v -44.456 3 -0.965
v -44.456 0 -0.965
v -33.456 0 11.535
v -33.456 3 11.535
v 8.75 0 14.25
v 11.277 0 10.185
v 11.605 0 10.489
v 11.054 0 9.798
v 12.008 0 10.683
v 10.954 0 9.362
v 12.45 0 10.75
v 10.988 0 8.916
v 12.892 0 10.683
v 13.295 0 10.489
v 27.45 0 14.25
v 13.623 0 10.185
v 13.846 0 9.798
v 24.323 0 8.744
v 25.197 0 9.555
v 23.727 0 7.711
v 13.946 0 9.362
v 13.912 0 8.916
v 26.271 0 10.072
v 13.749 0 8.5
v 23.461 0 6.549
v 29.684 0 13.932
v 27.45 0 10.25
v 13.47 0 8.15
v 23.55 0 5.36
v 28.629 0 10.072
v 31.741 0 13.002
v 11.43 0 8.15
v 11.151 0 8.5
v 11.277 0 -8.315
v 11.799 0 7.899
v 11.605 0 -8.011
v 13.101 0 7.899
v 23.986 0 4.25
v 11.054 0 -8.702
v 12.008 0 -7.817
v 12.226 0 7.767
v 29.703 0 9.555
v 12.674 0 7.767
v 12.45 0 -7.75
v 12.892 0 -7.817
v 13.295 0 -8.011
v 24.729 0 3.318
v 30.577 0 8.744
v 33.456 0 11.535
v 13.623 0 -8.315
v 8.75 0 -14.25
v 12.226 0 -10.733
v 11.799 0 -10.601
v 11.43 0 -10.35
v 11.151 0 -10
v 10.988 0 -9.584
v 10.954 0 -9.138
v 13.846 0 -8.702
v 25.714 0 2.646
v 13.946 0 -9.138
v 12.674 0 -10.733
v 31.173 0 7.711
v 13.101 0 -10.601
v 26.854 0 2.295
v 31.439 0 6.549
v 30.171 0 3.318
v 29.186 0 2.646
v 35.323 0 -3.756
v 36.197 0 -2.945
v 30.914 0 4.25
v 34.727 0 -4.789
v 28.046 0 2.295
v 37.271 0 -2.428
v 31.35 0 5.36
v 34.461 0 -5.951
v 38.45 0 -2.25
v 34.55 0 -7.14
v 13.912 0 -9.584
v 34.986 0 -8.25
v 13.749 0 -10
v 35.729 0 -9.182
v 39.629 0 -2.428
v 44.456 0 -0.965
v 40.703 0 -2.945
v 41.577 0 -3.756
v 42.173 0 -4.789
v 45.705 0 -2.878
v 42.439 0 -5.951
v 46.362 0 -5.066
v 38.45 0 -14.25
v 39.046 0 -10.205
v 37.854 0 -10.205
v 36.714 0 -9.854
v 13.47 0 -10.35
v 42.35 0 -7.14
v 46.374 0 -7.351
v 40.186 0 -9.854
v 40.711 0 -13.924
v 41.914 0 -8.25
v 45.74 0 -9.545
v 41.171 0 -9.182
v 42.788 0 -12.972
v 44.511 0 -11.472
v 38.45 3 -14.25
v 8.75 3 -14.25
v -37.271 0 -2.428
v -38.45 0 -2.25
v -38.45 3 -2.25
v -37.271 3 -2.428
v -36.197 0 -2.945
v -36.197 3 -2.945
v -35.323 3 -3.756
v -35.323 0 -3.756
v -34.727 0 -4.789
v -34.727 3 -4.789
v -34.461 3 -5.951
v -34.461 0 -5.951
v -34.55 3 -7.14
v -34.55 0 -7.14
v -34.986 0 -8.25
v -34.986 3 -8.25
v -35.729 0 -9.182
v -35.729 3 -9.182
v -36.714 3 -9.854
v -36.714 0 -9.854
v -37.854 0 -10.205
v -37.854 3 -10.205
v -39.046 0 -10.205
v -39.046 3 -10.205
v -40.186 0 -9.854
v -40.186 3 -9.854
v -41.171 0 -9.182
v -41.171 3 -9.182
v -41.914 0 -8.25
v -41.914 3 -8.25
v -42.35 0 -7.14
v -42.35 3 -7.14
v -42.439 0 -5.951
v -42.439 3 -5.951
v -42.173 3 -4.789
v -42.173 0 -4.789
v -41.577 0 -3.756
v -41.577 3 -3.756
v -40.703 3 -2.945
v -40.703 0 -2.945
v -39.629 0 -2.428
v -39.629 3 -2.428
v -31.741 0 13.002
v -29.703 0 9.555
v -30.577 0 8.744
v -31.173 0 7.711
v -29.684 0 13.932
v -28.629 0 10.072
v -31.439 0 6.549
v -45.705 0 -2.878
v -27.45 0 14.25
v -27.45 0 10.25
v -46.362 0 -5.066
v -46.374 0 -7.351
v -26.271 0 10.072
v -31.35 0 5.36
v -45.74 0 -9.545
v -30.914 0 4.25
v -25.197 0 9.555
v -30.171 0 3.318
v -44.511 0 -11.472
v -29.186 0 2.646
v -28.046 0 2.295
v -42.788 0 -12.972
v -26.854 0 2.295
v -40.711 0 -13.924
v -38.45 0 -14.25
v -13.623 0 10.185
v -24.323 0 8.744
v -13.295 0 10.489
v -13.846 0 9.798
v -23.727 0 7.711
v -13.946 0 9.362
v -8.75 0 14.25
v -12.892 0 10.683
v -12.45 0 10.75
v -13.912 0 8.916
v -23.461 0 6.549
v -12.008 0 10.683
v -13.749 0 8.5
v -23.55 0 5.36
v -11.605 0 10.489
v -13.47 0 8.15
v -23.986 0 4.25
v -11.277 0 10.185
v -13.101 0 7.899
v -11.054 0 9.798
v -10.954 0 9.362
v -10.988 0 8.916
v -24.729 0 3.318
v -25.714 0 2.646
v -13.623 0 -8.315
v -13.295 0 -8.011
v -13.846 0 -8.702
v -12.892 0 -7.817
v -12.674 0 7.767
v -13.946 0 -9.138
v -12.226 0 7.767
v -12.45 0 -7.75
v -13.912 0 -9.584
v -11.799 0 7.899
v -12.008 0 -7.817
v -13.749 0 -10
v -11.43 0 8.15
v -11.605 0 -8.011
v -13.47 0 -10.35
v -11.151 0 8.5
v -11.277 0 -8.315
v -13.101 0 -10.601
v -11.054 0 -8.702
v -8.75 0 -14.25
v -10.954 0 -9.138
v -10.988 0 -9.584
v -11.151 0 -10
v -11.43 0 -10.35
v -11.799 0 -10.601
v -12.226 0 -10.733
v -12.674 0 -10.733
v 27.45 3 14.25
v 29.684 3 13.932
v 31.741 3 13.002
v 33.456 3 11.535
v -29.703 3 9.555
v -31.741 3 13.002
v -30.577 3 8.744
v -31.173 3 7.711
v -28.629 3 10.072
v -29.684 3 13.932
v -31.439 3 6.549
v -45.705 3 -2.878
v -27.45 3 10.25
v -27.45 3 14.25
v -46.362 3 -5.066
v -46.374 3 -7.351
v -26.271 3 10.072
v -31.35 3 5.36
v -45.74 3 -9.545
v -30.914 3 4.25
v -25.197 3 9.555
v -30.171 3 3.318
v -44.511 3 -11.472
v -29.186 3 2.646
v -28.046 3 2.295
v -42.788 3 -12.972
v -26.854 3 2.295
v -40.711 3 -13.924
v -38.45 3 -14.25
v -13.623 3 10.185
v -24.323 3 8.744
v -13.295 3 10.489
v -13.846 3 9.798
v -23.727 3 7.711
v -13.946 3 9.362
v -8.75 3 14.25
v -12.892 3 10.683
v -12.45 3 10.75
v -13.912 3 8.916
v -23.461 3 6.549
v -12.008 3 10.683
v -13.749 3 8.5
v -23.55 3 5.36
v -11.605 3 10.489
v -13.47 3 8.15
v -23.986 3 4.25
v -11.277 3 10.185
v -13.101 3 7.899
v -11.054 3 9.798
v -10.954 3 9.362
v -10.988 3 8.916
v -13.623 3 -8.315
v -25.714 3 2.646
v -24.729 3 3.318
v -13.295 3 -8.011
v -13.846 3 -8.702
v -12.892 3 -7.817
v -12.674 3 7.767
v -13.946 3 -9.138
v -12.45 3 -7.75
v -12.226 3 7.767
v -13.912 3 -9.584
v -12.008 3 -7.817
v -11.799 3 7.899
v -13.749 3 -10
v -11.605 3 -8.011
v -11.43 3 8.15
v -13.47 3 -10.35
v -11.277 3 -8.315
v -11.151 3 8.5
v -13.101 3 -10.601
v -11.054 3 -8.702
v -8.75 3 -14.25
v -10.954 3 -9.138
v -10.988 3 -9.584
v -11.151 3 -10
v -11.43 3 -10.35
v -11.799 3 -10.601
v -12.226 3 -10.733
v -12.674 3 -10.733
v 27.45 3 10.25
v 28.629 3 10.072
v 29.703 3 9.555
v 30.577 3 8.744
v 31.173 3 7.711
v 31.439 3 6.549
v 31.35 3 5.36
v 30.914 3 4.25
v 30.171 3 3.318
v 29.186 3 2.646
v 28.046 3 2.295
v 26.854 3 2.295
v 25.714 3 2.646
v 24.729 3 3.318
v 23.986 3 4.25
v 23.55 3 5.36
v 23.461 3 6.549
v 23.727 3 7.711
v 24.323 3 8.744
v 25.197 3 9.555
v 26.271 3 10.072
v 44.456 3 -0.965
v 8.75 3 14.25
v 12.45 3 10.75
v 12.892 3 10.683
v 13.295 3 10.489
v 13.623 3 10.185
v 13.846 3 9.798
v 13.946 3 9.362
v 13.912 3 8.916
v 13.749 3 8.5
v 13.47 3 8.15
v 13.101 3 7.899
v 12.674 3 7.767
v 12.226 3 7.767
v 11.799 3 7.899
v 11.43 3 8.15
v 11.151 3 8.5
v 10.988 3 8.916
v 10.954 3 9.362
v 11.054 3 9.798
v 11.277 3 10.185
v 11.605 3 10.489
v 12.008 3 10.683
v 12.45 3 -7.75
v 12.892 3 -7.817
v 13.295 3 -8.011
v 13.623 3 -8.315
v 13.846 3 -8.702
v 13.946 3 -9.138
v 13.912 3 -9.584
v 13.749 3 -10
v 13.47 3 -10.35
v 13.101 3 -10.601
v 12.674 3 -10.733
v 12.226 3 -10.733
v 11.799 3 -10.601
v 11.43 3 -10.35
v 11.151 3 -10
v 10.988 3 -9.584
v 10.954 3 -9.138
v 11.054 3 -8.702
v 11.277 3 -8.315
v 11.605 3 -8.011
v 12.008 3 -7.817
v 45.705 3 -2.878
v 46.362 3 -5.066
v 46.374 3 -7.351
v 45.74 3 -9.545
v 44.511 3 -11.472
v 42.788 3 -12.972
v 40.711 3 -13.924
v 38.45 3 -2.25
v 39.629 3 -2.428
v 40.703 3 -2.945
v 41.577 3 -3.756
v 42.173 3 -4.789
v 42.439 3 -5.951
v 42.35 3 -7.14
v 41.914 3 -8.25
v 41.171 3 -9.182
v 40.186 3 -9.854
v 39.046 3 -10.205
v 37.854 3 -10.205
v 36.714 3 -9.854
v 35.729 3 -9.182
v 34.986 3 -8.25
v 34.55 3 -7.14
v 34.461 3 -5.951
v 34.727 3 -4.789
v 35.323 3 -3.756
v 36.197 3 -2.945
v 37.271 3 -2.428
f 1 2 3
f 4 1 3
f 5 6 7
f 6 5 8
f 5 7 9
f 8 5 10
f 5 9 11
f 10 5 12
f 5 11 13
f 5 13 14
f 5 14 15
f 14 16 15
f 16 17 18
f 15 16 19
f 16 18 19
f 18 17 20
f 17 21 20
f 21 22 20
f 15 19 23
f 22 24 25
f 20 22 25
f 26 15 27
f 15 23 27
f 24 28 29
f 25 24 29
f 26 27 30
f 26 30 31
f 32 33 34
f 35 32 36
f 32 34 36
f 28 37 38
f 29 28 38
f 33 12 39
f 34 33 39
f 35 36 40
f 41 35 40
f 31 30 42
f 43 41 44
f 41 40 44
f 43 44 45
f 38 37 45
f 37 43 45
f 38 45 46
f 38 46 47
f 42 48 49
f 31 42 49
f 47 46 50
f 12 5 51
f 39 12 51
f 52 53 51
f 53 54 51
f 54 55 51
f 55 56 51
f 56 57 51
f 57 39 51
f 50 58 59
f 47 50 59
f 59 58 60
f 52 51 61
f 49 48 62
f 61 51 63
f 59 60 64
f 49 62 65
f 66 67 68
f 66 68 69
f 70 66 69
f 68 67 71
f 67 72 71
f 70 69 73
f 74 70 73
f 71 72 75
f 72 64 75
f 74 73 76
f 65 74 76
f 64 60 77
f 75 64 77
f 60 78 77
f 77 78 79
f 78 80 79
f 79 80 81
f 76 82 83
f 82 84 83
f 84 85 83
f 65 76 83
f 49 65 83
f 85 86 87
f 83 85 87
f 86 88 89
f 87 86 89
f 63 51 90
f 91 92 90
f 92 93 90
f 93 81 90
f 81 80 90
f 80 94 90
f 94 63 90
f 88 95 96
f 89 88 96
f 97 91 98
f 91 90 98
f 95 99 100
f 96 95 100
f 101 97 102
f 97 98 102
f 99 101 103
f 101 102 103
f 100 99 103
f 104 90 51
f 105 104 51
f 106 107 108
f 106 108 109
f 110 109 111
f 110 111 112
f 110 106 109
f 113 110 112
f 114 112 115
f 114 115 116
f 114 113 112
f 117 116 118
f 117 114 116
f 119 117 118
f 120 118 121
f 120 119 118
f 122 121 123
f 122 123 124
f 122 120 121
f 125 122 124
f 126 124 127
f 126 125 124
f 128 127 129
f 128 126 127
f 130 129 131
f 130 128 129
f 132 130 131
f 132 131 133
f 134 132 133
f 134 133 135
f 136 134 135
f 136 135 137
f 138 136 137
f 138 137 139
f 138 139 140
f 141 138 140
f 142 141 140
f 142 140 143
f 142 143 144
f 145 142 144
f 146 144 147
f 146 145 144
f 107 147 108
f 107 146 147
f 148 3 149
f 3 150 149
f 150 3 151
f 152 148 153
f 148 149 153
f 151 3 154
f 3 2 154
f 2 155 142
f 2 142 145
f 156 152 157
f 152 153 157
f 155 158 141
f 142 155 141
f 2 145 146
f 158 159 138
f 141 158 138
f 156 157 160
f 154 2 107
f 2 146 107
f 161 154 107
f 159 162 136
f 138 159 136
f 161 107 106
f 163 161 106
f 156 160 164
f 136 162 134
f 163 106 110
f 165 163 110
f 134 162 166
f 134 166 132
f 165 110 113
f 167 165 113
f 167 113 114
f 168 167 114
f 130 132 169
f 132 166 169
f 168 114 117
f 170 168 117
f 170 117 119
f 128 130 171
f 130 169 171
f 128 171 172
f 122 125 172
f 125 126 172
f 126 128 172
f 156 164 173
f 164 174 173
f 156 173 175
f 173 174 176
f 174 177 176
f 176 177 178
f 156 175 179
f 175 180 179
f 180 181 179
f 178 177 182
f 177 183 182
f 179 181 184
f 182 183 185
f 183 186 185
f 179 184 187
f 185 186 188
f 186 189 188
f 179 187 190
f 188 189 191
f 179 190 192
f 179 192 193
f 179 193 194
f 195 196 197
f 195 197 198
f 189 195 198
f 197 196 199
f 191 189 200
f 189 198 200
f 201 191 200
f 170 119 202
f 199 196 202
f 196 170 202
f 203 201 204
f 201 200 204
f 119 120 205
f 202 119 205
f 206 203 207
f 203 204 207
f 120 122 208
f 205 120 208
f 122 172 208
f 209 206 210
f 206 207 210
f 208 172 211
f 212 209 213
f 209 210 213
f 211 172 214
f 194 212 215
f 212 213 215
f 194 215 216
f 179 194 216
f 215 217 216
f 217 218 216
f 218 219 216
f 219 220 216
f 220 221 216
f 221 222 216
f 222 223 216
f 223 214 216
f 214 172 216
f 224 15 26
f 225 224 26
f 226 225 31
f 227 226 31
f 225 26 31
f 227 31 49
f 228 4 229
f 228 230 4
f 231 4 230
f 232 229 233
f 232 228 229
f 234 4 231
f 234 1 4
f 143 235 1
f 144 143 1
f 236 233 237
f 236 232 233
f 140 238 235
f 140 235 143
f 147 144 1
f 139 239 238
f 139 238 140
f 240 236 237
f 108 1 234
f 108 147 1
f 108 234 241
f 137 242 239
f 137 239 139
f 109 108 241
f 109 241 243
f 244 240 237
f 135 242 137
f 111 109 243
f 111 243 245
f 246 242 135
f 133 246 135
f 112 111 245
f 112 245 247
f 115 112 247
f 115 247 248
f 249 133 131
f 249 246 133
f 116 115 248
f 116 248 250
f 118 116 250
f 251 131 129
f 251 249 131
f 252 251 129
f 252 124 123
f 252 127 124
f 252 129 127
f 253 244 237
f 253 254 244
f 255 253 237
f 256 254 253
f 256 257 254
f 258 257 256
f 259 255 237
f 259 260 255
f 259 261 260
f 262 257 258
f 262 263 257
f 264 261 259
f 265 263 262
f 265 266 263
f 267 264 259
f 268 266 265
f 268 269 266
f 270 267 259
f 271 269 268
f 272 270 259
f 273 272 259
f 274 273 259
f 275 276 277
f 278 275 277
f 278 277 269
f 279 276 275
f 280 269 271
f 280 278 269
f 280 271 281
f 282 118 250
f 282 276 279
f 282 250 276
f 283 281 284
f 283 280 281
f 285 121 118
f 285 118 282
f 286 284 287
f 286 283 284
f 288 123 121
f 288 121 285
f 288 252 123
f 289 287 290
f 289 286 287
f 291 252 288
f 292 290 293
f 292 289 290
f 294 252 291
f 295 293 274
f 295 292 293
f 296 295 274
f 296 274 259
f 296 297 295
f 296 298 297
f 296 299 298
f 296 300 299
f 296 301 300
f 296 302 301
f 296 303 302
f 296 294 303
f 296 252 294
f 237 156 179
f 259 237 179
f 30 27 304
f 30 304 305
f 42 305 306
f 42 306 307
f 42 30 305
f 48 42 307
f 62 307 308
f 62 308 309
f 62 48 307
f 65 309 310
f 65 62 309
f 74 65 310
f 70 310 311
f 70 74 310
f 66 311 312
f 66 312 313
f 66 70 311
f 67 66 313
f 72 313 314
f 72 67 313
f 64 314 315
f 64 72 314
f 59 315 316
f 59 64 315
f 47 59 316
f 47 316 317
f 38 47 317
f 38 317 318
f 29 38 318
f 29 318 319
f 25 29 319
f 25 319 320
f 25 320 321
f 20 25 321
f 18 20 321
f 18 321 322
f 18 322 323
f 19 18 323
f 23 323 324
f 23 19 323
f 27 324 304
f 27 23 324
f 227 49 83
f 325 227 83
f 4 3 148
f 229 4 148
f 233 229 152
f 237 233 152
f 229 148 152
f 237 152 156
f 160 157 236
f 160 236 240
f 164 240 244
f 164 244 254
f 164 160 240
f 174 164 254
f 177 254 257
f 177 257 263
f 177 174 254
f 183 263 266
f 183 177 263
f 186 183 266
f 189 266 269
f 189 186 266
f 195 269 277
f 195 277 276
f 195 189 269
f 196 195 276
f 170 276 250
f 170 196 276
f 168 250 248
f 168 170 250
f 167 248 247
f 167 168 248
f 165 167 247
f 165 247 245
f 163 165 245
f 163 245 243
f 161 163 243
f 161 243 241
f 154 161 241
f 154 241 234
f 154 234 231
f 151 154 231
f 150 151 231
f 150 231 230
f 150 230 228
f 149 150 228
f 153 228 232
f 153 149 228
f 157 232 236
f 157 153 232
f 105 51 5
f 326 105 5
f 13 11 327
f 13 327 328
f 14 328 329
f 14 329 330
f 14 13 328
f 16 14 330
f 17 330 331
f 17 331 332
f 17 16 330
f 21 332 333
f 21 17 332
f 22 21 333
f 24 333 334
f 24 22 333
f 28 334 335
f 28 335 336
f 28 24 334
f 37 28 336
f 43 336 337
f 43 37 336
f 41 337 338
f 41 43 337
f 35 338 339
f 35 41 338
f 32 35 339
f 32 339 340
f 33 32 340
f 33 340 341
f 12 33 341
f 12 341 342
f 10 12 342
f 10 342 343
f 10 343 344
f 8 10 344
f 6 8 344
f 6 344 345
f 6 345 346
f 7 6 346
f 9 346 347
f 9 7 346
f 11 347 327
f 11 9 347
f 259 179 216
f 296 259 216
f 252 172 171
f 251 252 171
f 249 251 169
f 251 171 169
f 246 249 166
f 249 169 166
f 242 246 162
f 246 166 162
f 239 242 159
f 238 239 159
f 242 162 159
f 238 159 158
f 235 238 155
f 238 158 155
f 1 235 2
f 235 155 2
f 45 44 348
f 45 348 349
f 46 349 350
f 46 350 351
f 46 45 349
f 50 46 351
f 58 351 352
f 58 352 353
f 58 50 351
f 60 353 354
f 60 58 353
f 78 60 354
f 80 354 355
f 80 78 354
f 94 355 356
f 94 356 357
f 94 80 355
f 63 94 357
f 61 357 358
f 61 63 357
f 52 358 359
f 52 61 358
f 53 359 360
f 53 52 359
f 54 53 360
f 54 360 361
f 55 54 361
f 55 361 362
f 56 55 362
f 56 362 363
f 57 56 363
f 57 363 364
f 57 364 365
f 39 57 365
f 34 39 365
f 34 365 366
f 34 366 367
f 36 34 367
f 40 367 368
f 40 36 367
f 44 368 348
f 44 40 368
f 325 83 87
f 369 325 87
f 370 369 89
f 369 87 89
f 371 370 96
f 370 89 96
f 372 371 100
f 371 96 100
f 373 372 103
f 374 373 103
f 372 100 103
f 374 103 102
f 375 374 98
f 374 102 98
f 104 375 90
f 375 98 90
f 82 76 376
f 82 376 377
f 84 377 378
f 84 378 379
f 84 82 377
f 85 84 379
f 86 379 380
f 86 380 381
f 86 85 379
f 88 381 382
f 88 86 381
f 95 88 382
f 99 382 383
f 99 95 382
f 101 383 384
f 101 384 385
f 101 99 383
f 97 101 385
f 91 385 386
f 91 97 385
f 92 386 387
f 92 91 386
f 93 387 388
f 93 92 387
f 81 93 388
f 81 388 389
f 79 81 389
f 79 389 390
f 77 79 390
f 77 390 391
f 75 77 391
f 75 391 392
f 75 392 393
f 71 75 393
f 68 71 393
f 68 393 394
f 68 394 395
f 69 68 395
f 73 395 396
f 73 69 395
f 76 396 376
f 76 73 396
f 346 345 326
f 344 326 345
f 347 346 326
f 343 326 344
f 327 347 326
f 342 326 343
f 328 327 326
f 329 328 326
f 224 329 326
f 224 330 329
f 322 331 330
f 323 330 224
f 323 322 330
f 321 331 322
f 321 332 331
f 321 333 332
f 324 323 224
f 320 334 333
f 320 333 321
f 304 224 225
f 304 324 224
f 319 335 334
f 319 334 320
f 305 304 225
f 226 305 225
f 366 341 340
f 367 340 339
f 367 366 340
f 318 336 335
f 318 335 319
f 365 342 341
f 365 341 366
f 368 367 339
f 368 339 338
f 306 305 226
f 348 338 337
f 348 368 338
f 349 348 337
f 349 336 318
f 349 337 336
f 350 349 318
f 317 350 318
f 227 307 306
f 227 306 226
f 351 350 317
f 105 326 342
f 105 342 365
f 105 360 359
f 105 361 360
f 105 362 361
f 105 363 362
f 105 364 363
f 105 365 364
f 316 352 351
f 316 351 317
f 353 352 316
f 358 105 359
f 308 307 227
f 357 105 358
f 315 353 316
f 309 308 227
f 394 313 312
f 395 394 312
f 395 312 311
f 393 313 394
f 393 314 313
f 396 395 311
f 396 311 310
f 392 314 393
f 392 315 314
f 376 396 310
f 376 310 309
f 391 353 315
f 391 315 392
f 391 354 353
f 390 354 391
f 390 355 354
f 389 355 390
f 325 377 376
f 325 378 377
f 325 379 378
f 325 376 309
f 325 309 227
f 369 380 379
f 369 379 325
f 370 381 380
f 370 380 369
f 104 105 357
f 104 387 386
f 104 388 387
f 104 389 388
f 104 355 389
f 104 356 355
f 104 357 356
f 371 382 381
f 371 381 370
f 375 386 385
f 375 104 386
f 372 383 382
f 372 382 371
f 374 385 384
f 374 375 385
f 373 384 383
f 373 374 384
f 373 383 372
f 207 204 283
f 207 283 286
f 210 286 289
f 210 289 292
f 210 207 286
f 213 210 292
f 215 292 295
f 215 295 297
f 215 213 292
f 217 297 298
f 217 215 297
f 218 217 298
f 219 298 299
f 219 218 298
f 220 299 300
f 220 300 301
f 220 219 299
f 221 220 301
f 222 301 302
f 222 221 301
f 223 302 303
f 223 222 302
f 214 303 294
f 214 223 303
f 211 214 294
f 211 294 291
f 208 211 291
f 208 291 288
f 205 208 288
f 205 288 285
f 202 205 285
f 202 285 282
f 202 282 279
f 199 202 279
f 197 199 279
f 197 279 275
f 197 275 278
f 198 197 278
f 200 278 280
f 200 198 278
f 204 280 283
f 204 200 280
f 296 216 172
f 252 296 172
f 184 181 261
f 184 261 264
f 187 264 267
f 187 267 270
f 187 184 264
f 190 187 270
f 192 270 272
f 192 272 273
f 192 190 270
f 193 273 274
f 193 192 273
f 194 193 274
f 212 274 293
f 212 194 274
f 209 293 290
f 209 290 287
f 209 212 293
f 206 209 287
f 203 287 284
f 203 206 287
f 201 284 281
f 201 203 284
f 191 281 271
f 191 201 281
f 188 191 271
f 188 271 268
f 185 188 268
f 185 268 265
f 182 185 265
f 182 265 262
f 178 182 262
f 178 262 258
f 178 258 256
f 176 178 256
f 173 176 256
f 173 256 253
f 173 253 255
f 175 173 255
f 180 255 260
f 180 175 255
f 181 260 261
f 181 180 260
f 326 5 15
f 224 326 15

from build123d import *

# Parameters (mm, degrees)
SKETCH1_R             = 1.5
SKETCH1_R_2           = 4.5
BOSS_EXTRUDE1_DEPTH   = 3
BOSS_EXTRUDE1_2_DEPTH = 3
BOSS_EXTRUDE2_START   = -3
SKETCH3_R             = 4.5
SKETCH3_R_2           = 4
BOSS_EXTRUDE2_DEPTH   = 3


with BuildPart() as part:
    # Sketch1 → Boss-Extrude1 (new body)
    with BuildSketch(Plane(origin=(0, 0, 0), x_dir=(1, 0, 0), z_dir=(0, 1, 0))):
        with BuildLine():
            Line((-27.45, -14.25), (-8.75, -14.25))
            Line((-8.75, -14.25), (-8.75, 14.25))
            Line((-8.75, 14.25), (-38.45, 14.25))
            ThreePointArc((-38.45, 14.25), (-45.739725141, 9.545437355), (-44.455708135, 0.964976841))
            Line((-44.455708135, 0.964976841), (-33.455708135, -11.535023159))
            ThreePointArc((-33.455708135, -11.535023159), (-30.745437355, -13.539725141), (-27.45, -14.25))
        make_face()
        with Locations(Location((-12.45, 9.25, 0), (0, 0, 270))):
            Circle(SKETCH1_R, mode=Mode.SUBTRACT)
        with Locations(Location((-12.45, -9.25, 0), (0, 0, 270))):
            Circle(SKETCH1_R, mode=Mode.SUBTRACT)
        with Locations(Location((-38.45, 6.25, 0), (0, 0, 270))):
            Circle(SKETCH1_R_2, mode=Mode.SUBTRACT)
        with Locations(Location((-27.45, -6.25, 0), (0, 0, 270))):
            Circle(SKETCH1_R_2, mode=Mode.SUBTRACT)
    extrude(amount=BOSS_EXTRUDE1_DEPTH)



with BuildPart() as body_2:
    # Sketch1 → Boss-Extrude1 2 (new body)
    with BuildSketch(Plane(origin=(0, 0, 0), x_dir=(1, 0, 0), z_dir=(0, 1, 0))):
        with BuildLine():
            Line((8.75, 14.25), (8.75, -14.25))
            Line((8.75, -14.25), (27.45, -14.25))
            ThreePointArc((27.45, -14.25), (30.745437355, -13.539725141), (33.455708135, -11.535023159))
            Line((33.455708135, -11.535023159), (44.455708135, 0.964976841))
            ThreePointArc((44.455708135, 0.964976841), (45.739725141, 9.545437355), (38.45, 14.25))
            Line((38.45, 14.25), (8.75, 14.25))
        make_face()
        with Locations(Location((27.45, -6.25, 0), (0, 0, 270))):
            Circle(SKETCH1_R_2, mode=Mode.SUBTRACT)
        with Locations(Location((38.45, 6.25, 0), (0, 0, 270))):
            Circle(SKETCH1_R_2, mode=Mode.SUBTRACT)
        with Locations(Location((12.45, -9.25, 0), (0, 0, 270))):
            Circle(SKETCH1_R, mode=Mode.SUBTRACT)
        with Locations(Location((12.45, 9.25, 0), (0, 0, 270))):
            Circle(SKETCH1_R, mode=Mode.SUBTRACT)
    extrude(amount=BOSS_EXTRUDE1_2_DEPTH)


with BuildPart() as part_1:
    add(part.part)

    add(body_2.part)  # Boss-Extrude2 merges body 2
    # Sketch3 → Boss-Extrude2 (add)
    # profile 1 of 4: a face of its own
    with BuildSketch(Plane(origin=(0, 3, 0), x_dir=(1, 0, 0), z_dir=(0, 1, 0)).offset(BOSS_EXTRUDE2_START)):
        with Locations((-38.45, 6.25)):
            Circle(SKETCH3_R)
        with Locations(Location((-38.45, 6.25, 0), (0, 0, 270))):
            Circle(SKETCH3_R_2, mode=Mode.SUBTRACT)
    # profile 2 of 4: a face of its own
    with BuildSketch(Plane(origin=(0, 3, 0), x_dir=(1, 0, 0), z_dir=(0, 1, 0)).offset(BOSS_EXTRUDE2_START)):
        with Locations((-27.45, -6.25)):
            Circle(SKETCH3_R)
        with Locations(Location((-27.45, -6.25, 0), (0, 0, 270))):
            Circle(SKETCH3_R_2, mode=Mode.SUBTRACT)
    # profile 3 of 4: a face of its own
    with BuildSketch(Plane(origin=(0, 3, 0), x_dir=(1, 0, 0), z_dir=(0, 1, 0)).offset(BOSS_EXTRUDE2_START)):
        with Locations((38.45, 6.25)):
            Circle(SKETCH3_R)
        with Locations(Location((38.45, 6.25, 0), (0, 0, 270))):
            Circle(SKETCH3_R_2, mode=Mode.SUBTRACT)
    # profile 4 of 4: a face of its own
    with BuildSketch(Plane(origin=(0, 3, 0), x_dir=(1, 0, 0), z_dir=(0, 1, 0)).offset(BOSS_EXTRUDE2_START)):
        with Locations((27.45, -6.25)):
            Circle(SKETCH3_R)
        with Locations(Location((27.45, -6.25, 0), (0, 0, 270))):
            Circle(SKETCH3_R_2, mode=Mode.SUBTRACT)
    extrude(amount=BOSS_EXTRUDE2_DEPTH)


solid = part_1.part
